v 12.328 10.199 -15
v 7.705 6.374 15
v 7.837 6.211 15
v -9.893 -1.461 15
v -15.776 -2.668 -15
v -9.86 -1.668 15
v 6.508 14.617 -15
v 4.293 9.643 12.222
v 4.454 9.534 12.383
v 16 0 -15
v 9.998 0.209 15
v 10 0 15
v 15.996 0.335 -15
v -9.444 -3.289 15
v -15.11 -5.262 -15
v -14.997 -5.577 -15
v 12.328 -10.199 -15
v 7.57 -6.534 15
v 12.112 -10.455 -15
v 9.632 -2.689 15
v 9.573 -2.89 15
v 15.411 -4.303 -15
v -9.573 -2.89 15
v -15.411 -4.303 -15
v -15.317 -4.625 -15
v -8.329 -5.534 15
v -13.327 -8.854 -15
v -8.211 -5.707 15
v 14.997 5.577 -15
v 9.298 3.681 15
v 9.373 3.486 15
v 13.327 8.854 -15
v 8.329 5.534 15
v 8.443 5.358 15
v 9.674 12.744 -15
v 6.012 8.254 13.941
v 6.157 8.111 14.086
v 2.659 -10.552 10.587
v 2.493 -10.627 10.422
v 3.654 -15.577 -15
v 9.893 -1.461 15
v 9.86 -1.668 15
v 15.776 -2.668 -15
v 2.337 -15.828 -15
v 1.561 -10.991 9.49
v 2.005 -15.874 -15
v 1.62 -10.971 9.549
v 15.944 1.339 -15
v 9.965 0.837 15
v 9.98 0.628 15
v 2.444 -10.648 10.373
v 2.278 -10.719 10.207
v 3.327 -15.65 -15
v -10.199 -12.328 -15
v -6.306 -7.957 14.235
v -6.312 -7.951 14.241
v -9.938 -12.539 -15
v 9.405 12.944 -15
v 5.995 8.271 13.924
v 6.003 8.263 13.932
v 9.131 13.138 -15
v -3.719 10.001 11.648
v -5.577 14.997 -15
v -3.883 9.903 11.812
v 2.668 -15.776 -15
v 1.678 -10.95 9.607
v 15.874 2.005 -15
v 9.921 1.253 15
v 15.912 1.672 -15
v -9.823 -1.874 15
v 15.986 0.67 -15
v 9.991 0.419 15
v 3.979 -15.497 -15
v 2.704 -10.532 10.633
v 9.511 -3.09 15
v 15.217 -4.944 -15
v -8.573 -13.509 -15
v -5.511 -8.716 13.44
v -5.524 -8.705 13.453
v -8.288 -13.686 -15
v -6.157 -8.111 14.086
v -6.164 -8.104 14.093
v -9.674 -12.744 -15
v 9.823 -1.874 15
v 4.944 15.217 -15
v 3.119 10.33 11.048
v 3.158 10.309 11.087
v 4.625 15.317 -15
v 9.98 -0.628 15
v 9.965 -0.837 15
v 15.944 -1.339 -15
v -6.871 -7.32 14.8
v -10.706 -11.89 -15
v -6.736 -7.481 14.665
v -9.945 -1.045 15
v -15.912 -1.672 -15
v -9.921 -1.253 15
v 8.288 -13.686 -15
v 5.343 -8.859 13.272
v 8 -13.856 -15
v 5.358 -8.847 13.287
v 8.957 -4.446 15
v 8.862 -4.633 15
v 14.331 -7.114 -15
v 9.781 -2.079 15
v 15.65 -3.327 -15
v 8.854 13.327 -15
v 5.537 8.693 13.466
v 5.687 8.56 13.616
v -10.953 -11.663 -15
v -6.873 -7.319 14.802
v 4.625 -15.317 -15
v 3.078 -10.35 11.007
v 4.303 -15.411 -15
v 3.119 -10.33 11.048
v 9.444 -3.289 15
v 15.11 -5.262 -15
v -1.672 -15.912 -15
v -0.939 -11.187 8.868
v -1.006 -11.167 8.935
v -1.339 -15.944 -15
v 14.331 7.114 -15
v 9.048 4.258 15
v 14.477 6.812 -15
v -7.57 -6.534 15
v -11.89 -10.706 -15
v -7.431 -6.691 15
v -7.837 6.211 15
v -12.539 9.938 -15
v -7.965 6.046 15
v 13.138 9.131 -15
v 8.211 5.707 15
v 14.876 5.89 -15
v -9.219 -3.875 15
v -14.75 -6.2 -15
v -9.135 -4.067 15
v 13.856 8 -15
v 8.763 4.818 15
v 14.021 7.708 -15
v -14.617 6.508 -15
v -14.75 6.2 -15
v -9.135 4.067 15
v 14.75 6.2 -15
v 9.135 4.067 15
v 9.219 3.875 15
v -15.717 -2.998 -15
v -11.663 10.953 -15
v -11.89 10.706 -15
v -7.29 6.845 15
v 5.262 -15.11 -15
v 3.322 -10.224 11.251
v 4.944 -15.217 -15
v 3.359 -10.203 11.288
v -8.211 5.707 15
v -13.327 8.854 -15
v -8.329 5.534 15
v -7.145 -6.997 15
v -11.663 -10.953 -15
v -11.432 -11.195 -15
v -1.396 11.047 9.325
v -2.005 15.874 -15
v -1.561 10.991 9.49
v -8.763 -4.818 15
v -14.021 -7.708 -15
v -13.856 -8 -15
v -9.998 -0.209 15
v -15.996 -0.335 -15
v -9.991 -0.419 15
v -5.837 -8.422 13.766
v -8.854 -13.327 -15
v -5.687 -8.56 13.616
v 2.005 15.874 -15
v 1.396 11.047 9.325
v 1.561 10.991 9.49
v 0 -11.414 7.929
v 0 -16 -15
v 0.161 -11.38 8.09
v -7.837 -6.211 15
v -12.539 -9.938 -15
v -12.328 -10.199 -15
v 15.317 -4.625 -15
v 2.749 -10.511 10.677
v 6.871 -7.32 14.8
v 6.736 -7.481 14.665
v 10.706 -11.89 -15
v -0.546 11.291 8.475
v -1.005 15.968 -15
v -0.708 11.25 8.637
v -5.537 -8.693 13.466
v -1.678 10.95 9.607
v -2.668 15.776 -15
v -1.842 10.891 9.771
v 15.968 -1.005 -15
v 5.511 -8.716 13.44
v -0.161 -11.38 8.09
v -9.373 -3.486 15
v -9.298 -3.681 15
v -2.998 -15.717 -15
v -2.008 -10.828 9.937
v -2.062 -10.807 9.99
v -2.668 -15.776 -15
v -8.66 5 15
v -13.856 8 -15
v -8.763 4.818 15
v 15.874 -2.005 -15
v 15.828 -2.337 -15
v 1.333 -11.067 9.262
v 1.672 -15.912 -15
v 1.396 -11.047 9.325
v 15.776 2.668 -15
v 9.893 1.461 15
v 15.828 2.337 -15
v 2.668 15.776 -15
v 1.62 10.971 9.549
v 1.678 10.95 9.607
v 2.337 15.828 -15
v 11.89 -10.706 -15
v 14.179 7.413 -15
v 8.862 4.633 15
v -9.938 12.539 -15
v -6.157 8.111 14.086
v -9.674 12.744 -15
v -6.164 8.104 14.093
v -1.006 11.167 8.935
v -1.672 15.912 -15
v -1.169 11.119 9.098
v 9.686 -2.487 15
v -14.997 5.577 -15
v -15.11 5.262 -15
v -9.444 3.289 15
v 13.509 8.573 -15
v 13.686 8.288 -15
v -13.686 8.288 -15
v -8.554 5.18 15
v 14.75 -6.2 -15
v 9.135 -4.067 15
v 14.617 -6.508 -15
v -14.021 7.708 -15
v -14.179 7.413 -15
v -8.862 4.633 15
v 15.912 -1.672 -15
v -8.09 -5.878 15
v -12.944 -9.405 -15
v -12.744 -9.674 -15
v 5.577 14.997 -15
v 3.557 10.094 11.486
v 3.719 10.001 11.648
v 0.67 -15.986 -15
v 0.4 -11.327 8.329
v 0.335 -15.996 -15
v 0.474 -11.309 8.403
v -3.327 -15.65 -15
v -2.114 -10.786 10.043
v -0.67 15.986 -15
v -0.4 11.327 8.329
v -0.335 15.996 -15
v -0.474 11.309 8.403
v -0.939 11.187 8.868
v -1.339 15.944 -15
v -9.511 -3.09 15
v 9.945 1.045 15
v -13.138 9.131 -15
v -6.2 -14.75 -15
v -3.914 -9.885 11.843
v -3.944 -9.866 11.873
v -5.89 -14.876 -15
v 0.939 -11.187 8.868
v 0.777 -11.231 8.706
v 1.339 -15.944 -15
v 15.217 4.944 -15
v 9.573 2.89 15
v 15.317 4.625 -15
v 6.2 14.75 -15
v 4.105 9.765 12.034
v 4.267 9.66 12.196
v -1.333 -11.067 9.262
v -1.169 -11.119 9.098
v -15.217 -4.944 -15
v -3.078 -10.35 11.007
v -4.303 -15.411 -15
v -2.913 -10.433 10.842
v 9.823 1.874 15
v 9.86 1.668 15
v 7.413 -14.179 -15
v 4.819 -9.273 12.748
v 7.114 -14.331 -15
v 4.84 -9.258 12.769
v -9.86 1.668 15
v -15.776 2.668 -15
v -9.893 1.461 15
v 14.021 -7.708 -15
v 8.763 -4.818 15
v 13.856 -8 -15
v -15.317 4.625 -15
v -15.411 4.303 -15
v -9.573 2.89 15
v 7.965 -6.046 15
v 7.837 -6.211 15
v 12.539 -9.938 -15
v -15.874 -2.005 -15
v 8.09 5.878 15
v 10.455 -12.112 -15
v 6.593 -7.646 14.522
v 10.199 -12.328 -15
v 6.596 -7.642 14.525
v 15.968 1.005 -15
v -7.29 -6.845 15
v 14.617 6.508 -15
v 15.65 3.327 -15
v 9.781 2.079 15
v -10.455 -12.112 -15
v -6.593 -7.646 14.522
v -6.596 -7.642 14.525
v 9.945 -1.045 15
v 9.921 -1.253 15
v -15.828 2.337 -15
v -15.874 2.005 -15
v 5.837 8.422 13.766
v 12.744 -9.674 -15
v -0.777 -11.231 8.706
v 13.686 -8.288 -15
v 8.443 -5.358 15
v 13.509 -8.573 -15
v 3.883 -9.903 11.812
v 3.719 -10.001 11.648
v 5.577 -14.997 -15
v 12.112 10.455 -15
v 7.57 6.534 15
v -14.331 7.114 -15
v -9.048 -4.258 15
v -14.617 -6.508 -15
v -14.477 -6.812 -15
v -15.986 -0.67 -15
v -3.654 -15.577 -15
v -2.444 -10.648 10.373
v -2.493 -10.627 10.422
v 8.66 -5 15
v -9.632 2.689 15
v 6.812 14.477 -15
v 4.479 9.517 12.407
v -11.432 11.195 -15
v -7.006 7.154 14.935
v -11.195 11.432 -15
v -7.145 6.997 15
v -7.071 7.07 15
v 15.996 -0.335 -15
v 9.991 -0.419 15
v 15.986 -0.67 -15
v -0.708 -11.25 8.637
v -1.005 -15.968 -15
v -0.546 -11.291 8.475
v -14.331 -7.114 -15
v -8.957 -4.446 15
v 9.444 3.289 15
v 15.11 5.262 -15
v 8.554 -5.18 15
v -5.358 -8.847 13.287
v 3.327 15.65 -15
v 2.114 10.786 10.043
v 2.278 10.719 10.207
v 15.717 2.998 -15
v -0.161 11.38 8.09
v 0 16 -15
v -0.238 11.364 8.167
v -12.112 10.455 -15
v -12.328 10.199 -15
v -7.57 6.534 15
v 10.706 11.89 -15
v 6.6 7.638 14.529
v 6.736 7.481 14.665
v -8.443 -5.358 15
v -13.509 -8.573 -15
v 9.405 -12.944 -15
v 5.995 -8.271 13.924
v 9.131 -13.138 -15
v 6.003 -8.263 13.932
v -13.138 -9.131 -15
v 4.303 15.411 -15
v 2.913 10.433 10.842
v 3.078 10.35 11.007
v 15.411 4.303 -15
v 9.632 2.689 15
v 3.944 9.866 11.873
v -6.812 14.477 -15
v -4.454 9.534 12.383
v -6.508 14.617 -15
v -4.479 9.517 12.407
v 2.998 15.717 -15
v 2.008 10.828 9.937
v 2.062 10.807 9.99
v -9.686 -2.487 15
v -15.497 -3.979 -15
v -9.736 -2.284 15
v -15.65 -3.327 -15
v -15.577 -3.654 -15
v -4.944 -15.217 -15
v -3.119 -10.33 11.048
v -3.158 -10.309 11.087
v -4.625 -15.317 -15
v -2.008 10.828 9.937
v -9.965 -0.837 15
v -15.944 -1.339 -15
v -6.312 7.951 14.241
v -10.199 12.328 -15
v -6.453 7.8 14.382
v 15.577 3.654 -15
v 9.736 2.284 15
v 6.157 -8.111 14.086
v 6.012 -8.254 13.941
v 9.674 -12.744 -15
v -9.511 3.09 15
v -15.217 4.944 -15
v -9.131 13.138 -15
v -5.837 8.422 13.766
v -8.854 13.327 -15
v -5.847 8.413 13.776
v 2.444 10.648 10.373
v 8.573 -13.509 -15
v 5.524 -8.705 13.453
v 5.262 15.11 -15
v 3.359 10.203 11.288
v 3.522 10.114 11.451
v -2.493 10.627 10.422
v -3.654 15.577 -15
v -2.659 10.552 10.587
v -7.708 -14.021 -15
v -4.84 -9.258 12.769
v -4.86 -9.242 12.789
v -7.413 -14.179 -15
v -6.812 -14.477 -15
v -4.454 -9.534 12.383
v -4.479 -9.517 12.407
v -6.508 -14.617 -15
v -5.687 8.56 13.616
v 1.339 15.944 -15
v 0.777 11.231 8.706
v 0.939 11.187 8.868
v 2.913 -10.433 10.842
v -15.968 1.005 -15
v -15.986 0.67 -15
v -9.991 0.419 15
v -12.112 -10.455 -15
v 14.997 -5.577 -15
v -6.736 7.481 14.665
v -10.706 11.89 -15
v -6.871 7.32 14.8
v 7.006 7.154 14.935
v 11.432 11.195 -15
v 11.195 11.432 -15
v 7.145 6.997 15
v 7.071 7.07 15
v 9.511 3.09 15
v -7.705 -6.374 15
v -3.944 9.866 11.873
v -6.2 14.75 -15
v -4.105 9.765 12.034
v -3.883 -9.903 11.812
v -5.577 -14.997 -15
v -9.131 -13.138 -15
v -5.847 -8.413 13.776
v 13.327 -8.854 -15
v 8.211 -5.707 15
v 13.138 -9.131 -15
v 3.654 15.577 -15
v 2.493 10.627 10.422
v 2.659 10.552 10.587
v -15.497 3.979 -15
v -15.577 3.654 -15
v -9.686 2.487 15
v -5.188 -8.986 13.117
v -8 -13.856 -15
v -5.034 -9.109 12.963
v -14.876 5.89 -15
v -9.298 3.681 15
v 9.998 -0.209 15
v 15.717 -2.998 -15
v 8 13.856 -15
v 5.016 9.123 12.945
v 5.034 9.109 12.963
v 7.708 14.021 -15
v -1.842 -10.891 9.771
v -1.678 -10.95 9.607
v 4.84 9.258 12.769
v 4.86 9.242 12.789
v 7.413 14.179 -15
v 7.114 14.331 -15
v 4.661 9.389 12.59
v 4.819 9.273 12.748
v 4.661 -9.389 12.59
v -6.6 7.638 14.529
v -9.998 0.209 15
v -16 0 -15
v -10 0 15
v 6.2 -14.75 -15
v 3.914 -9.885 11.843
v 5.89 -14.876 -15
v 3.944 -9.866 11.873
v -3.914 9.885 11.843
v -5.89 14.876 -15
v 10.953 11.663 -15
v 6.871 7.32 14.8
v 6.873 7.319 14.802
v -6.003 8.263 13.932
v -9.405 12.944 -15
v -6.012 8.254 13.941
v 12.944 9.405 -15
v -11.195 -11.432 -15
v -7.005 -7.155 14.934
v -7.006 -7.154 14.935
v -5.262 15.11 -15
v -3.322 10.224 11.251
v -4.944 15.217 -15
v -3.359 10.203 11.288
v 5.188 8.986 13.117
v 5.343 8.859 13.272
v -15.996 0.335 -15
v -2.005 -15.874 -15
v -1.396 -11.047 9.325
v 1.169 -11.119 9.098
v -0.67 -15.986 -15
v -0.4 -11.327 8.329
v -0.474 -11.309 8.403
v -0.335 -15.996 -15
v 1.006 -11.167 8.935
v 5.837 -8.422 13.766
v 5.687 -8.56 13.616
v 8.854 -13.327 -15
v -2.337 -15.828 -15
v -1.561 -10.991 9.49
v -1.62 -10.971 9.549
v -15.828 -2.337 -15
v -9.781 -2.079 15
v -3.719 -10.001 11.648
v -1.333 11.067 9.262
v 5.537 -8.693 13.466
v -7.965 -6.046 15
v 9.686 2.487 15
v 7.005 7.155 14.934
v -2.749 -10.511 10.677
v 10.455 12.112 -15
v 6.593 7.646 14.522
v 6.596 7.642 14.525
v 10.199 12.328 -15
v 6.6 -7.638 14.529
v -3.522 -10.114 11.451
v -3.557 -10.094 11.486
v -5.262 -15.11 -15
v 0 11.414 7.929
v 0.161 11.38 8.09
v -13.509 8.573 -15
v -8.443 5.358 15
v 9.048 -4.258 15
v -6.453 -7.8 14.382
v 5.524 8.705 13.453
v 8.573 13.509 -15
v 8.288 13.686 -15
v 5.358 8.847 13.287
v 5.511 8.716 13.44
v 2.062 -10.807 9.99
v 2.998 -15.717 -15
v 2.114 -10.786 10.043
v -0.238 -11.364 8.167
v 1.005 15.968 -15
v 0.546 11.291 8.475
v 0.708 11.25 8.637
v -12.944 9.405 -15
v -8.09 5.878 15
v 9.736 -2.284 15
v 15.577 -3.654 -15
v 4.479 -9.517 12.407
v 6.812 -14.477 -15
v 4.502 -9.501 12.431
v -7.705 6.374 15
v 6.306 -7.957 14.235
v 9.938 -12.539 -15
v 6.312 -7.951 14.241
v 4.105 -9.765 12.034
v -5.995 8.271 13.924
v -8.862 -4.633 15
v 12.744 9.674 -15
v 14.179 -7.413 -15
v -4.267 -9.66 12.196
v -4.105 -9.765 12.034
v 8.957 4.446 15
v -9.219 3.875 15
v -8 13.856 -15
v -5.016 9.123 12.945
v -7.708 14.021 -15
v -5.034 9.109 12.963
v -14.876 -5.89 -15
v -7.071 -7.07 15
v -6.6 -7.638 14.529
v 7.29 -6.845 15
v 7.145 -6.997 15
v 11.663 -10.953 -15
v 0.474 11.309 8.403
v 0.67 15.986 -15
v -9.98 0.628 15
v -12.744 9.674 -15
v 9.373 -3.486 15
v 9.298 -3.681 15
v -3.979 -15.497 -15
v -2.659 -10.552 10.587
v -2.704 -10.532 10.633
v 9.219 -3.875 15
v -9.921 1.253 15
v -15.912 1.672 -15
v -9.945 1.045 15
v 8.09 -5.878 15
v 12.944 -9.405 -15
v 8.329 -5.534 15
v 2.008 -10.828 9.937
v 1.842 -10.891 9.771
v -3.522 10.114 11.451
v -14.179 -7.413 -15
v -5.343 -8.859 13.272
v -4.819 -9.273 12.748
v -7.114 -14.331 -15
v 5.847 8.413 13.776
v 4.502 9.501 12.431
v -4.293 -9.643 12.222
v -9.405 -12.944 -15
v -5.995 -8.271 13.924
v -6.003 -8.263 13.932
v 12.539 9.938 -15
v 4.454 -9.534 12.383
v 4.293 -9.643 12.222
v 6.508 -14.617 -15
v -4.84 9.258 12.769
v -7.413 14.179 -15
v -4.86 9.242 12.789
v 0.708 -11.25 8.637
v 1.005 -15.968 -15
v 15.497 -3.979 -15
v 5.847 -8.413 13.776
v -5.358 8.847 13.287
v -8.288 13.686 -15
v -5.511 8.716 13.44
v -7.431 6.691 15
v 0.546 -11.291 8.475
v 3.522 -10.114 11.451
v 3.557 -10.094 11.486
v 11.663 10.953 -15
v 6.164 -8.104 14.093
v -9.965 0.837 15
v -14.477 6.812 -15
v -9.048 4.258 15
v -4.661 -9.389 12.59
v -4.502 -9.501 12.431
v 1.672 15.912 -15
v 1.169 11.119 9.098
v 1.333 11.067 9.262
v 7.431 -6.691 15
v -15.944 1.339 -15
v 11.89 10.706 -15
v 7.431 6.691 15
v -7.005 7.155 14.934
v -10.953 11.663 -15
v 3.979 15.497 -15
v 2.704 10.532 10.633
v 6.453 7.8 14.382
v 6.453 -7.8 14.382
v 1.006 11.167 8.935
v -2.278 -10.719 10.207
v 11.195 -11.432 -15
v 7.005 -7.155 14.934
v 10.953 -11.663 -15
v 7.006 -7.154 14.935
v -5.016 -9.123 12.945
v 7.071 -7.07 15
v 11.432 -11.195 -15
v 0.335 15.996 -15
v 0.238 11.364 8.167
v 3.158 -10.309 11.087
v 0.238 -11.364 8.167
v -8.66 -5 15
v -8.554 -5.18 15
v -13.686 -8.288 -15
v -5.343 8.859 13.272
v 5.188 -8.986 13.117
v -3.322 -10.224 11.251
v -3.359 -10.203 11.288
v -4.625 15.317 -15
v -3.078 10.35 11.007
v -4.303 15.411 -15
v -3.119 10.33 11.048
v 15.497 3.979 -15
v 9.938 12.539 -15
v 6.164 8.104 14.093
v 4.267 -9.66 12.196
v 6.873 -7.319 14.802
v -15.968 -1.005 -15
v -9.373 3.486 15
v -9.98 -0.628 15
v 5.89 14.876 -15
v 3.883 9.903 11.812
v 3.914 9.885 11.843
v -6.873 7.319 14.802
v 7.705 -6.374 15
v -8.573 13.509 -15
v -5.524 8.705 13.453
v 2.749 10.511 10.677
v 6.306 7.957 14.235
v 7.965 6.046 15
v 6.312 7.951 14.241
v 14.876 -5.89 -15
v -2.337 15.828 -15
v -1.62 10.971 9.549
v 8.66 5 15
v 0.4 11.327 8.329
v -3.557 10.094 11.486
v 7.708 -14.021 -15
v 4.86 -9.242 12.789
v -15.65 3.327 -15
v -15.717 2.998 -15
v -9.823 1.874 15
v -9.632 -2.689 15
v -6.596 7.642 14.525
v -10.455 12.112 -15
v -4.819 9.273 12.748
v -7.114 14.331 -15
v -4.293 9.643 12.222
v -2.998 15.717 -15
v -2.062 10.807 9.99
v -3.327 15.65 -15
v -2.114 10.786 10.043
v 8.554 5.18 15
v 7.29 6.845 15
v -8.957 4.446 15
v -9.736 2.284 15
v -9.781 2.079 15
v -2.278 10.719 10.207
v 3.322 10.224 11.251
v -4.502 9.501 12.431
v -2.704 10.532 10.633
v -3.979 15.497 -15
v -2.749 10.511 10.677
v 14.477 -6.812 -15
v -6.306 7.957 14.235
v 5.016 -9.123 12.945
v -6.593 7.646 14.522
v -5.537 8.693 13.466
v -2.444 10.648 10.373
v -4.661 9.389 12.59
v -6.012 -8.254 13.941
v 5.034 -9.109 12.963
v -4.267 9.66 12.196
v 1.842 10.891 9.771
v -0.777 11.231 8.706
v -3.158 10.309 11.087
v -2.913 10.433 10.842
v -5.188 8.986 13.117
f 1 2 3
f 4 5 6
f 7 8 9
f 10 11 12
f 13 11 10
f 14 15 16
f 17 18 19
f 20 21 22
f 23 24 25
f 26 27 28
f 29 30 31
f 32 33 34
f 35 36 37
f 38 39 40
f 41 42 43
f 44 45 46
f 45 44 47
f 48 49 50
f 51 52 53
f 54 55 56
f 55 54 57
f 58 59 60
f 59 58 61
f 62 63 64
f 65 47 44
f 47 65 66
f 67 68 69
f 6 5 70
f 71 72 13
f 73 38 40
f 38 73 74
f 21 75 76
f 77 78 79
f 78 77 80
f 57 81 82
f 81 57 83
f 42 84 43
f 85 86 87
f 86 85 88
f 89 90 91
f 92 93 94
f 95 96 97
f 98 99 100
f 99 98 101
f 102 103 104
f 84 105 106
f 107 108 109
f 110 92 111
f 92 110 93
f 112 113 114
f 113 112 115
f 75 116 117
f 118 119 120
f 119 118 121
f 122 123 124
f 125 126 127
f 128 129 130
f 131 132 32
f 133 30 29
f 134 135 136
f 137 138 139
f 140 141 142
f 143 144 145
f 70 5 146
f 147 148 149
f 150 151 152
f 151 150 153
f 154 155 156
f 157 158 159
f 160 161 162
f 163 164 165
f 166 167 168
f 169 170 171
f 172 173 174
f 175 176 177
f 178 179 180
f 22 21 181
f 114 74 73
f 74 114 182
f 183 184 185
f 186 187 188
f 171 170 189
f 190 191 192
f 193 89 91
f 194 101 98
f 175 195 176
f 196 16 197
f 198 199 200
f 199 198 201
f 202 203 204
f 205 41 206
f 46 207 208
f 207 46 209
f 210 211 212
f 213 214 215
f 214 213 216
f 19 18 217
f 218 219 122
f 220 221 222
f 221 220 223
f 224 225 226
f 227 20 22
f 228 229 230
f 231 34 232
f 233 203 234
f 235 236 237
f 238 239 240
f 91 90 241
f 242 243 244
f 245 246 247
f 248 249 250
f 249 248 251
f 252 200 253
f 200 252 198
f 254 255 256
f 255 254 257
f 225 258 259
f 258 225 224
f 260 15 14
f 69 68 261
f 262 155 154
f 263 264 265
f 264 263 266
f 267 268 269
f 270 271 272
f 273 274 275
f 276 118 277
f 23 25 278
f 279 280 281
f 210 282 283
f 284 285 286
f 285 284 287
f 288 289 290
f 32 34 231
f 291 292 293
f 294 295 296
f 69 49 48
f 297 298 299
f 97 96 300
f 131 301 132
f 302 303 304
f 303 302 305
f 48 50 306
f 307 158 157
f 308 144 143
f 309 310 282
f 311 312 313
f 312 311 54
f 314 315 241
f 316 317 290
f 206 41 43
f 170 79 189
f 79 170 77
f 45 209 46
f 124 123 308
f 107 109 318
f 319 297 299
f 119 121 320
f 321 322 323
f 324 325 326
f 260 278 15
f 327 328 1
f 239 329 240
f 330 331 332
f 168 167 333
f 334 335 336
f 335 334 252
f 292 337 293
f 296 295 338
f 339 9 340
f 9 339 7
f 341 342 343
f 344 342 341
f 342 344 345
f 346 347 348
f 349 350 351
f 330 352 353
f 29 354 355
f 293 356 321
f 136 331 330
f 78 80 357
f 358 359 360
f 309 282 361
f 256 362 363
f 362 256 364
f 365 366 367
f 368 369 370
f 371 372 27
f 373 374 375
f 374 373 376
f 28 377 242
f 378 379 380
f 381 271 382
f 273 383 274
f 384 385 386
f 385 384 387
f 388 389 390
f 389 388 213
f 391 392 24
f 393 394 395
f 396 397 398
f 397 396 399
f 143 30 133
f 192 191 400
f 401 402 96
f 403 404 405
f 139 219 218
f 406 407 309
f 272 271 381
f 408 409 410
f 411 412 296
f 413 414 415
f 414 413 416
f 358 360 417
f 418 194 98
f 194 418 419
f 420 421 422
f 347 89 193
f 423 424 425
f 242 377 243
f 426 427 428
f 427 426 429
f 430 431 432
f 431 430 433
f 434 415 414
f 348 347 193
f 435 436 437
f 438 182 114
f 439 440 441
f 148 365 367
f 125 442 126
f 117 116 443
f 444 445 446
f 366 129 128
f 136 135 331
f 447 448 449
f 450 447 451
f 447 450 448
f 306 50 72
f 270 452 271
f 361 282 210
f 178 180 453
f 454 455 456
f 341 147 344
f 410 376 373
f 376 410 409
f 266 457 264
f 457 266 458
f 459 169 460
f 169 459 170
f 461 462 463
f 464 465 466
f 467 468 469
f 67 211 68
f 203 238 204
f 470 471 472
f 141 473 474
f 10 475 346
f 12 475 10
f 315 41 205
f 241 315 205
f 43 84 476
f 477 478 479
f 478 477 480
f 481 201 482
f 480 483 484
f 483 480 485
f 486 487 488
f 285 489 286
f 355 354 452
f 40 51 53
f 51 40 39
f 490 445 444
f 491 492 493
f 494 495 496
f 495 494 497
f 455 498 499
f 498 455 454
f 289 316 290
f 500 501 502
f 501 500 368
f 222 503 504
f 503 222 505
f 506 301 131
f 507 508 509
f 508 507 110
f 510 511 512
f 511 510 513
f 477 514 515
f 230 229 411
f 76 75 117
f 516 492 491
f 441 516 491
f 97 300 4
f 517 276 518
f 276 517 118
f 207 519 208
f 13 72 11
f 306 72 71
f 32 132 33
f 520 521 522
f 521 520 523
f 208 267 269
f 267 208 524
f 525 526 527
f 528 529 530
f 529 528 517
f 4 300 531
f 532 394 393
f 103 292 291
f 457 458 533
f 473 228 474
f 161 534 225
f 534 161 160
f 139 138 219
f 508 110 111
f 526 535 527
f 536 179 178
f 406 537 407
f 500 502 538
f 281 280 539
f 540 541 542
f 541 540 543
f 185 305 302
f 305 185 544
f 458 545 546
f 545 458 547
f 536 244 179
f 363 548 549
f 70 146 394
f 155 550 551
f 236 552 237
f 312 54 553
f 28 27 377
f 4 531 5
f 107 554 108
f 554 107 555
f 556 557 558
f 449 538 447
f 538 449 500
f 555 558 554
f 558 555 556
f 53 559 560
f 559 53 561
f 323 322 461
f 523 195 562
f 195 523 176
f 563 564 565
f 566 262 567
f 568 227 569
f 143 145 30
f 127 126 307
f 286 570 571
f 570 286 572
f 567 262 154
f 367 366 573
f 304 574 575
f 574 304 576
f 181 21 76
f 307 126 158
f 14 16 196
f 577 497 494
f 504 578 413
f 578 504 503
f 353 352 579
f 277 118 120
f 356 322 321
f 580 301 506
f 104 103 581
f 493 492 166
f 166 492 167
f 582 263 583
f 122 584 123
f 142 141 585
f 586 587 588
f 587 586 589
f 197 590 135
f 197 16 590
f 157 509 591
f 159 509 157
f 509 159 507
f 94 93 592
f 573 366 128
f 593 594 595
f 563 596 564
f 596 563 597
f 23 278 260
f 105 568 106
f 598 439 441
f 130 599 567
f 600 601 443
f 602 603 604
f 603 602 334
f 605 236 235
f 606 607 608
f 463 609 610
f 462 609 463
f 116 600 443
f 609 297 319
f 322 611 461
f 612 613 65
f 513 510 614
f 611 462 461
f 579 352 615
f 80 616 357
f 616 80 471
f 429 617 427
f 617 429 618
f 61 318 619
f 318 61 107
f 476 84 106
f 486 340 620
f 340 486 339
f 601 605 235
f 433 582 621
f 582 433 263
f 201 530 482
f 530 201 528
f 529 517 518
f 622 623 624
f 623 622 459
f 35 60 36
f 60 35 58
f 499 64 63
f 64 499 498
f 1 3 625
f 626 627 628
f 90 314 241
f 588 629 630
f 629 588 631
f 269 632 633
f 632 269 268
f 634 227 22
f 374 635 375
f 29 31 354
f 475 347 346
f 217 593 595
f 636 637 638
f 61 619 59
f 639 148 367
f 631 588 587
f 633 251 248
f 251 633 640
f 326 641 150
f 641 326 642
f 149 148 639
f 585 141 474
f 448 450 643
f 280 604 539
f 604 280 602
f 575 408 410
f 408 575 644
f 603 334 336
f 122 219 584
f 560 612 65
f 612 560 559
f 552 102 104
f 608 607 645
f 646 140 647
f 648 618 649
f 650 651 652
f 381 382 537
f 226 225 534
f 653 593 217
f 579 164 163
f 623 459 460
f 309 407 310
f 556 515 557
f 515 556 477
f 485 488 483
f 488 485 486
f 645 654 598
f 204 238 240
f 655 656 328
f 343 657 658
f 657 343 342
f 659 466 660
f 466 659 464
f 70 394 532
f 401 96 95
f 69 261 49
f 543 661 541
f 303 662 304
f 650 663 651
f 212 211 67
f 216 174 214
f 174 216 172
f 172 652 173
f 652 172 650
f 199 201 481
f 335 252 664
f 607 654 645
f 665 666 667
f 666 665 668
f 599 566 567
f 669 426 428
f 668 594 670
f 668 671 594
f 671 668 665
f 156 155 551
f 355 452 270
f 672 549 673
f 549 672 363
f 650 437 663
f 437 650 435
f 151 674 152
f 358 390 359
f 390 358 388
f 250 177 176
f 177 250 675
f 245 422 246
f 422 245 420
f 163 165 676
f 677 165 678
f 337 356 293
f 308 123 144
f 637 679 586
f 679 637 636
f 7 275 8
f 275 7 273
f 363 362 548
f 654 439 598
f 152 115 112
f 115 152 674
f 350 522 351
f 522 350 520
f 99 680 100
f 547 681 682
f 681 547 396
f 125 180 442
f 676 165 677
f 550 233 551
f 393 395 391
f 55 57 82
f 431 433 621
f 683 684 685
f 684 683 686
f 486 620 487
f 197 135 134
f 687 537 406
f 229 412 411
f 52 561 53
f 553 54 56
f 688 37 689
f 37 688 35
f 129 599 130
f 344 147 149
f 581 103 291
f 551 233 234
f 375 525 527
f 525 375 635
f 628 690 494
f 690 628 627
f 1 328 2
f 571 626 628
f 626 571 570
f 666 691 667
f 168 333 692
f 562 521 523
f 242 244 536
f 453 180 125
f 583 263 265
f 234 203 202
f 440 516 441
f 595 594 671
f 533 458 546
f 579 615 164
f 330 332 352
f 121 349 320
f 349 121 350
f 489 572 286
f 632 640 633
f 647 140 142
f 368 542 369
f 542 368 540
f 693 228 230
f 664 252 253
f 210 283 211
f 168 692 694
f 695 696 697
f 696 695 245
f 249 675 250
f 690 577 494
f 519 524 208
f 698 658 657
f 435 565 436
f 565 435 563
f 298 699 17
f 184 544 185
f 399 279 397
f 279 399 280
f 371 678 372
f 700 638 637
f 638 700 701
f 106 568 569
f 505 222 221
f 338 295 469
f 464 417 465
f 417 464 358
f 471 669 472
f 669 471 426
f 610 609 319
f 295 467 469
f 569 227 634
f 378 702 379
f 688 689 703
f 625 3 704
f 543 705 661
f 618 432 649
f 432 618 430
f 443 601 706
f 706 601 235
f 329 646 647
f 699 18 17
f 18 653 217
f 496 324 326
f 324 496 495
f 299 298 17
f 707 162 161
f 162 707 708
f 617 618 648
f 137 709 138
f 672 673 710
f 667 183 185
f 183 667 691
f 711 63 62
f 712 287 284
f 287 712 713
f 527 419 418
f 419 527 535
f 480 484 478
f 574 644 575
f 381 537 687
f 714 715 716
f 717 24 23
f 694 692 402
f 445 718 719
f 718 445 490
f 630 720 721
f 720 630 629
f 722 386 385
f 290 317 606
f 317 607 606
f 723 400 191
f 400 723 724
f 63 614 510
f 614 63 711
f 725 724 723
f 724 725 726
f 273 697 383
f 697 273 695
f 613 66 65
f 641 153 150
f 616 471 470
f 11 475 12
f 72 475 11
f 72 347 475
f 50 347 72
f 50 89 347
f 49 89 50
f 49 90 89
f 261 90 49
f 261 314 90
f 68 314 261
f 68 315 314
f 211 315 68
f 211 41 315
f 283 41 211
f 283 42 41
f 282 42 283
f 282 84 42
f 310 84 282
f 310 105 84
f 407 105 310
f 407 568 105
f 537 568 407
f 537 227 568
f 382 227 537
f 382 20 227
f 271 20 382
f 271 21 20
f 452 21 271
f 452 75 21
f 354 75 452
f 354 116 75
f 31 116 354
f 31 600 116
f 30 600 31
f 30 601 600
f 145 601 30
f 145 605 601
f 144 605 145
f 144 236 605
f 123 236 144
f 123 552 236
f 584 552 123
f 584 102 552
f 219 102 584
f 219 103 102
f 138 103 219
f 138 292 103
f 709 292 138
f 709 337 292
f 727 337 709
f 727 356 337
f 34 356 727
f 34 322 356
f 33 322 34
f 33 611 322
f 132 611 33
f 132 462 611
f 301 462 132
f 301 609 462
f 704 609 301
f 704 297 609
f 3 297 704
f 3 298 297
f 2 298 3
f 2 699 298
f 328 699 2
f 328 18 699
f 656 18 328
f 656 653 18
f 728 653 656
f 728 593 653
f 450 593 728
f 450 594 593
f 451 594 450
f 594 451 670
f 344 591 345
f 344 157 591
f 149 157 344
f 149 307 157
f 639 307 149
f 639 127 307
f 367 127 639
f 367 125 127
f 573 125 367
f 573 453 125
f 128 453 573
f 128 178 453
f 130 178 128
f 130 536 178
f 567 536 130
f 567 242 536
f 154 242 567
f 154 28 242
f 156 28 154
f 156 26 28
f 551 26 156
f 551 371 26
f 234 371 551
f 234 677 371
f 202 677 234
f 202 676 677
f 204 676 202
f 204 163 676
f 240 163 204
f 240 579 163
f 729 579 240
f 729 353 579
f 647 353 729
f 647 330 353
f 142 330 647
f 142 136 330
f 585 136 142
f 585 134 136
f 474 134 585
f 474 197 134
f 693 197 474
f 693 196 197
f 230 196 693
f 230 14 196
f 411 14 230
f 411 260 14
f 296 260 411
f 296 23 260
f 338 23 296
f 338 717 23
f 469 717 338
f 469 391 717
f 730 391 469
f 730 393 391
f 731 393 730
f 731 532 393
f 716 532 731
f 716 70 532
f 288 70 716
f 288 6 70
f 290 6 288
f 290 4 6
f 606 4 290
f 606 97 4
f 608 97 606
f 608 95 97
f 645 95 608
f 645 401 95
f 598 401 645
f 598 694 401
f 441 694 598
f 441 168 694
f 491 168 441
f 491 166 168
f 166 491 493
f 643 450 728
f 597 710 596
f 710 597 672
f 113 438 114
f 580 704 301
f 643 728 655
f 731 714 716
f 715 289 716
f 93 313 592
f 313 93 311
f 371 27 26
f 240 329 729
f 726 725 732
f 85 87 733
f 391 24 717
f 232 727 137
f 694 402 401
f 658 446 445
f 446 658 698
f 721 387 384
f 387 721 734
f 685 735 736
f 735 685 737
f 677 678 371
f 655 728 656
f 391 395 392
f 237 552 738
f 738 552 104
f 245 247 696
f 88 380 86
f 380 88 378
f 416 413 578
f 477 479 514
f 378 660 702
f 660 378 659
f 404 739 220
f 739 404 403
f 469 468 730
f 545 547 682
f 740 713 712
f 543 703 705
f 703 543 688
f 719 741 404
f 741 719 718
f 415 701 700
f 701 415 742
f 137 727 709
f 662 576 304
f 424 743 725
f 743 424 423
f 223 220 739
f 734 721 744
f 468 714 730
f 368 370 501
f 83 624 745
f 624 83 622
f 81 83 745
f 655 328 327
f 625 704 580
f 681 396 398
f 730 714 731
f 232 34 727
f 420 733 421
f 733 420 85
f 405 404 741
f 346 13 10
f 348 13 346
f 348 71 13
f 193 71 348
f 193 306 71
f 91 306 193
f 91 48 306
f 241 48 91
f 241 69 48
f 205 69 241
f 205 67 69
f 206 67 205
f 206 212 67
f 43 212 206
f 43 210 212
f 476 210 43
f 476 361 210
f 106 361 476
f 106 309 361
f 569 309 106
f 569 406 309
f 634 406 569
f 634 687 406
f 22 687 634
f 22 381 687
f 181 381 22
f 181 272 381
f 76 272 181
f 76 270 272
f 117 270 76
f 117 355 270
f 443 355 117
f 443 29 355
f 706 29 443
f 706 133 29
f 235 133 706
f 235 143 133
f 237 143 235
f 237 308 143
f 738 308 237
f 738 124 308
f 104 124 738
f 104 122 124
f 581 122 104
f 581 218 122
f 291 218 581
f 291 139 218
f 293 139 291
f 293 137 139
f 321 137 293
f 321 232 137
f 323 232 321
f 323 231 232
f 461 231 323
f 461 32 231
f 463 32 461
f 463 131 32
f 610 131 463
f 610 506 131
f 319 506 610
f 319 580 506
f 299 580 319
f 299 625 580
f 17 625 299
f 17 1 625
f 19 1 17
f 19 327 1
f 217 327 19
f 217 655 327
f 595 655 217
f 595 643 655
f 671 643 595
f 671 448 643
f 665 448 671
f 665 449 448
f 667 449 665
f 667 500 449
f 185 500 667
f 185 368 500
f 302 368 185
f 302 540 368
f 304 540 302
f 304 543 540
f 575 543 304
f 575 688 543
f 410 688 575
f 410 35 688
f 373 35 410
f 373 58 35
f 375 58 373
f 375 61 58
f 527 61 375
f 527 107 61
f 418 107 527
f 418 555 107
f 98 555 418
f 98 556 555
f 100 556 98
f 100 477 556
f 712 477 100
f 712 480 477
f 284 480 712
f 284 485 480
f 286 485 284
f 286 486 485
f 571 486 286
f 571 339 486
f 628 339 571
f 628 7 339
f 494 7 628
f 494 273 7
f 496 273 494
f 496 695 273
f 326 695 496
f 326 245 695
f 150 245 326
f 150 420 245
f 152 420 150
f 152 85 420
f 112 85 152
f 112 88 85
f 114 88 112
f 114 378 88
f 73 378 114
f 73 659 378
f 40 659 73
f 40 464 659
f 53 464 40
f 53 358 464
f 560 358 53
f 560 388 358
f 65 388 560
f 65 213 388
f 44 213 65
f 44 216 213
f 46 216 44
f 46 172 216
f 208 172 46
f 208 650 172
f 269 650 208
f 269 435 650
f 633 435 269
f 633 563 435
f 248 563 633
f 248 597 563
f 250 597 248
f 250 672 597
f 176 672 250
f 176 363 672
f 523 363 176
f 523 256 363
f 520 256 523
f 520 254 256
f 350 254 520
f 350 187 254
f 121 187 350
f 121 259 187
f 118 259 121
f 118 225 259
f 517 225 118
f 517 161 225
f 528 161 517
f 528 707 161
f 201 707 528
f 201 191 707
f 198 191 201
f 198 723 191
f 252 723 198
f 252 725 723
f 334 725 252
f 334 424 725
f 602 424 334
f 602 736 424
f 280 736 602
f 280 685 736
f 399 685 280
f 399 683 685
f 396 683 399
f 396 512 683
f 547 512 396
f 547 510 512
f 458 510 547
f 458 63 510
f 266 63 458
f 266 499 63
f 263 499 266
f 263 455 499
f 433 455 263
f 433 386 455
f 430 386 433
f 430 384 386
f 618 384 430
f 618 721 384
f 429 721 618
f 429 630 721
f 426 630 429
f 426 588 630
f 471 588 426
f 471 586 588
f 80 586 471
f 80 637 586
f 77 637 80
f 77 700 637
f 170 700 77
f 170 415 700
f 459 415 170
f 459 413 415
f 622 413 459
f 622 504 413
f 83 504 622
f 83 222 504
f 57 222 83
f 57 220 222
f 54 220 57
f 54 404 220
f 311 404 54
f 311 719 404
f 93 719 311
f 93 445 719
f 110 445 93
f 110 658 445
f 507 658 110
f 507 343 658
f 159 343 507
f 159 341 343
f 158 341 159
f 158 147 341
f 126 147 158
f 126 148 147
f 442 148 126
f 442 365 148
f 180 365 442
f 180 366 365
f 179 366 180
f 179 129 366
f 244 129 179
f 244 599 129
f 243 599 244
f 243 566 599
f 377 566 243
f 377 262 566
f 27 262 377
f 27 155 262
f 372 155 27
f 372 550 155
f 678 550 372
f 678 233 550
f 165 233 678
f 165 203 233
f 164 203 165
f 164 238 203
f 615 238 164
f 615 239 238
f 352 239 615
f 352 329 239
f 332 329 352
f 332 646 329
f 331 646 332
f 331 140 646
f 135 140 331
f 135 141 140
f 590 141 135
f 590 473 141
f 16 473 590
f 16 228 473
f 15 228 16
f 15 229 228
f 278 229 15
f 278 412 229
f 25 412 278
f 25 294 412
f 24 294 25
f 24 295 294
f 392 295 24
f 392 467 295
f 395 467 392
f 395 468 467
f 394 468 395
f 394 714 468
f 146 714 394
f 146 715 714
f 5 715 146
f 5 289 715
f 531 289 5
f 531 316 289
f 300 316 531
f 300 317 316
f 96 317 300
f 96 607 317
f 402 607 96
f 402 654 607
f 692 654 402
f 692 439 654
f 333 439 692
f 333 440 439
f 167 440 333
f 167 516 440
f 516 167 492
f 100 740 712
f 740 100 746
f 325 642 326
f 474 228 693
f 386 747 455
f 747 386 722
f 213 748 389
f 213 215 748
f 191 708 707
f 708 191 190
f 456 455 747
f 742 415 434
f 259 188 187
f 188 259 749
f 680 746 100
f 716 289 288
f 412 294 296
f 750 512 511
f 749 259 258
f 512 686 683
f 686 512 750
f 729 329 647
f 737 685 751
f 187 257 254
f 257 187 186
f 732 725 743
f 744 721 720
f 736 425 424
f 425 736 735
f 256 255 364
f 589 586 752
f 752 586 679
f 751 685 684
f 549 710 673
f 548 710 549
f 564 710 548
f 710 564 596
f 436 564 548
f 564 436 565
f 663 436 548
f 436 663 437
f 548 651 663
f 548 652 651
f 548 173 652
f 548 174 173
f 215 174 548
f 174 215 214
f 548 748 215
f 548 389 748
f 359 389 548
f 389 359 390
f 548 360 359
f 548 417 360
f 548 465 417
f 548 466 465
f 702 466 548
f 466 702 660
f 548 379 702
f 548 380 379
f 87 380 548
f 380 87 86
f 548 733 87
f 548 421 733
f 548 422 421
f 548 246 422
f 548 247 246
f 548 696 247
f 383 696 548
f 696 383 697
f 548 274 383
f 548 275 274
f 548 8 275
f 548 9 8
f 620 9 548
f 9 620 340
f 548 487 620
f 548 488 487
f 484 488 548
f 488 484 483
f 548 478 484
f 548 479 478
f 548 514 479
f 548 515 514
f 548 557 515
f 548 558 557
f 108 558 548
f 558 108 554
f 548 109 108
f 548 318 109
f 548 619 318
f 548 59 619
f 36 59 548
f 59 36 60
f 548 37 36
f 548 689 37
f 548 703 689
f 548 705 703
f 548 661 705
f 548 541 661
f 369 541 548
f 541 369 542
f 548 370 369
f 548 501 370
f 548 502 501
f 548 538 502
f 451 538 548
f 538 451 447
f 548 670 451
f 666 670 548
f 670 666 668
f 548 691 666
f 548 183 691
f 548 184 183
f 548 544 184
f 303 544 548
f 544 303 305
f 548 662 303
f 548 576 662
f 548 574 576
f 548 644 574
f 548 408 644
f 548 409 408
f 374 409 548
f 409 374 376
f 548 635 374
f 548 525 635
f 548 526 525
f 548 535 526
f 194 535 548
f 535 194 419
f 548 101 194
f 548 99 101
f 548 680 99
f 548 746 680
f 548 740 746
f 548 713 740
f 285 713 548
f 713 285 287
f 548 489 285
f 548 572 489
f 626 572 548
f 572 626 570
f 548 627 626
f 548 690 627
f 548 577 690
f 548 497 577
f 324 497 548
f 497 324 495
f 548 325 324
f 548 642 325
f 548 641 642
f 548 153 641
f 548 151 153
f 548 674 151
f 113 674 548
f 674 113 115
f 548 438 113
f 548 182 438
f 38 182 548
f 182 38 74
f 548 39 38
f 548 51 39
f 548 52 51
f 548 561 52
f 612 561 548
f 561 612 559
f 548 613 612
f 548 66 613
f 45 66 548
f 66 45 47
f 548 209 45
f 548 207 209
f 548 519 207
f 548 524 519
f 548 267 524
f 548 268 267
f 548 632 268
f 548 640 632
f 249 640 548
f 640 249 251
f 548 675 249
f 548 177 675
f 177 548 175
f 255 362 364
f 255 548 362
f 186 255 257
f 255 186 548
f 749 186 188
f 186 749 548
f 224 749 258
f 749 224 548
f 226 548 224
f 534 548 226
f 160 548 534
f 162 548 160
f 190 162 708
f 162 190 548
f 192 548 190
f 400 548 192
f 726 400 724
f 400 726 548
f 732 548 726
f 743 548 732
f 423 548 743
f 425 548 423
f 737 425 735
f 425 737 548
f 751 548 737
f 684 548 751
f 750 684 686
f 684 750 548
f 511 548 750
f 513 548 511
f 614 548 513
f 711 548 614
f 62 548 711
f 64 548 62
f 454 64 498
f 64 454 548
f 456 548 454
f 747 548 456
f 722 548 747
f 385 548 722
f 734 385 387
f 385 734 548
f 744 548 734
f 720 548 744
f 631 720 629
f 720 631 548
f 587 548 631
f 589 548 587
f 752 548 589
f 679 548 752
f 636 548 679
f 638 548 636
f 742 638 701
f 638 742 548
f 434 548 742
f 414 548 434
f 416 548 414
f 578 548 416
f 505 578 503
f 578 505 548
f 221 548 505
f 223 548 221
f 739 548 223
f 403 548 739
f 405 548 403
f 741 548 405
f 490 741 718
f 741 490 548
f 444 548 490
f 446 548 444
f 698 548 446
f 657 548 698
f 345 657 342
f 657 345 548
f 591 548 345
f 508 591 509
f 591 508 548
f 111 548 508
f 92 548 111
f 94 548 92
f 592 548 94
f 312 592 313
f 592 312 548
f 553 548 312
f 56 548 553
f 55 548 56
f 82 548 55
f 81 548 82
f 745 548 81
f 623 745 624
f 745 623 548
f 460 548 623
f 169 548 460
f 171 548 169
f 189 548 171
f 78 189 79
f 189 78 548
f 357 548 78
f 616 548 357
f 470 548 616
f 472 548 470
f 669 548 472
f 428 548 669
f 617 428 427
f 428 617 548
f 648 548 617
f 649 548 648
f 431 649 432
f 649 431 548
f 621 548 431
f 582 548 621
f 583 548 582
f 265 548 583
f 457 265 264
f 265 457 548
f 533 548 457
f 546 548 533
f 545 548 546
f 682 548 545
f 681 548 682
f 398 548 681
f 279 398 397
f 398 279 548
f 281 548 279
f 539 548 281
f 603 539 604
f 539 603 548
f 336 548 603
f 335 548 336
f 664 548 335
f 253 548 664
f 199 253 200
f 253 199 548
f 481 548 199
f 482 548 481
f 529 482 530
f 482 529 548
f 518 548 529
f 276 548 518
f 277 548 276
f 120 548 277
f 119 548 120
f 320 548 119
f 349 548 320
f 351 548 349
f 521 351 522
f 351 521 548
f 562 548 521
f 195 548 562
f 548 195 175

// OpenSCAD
$fn = 300;
difference(){

cylinder(h=30, r1=16, r2=10, center=true);
	
translate ([0,0,15]) {
rotate([0,45,0]){
cube([10,100,10], center=true);
}
}
}
